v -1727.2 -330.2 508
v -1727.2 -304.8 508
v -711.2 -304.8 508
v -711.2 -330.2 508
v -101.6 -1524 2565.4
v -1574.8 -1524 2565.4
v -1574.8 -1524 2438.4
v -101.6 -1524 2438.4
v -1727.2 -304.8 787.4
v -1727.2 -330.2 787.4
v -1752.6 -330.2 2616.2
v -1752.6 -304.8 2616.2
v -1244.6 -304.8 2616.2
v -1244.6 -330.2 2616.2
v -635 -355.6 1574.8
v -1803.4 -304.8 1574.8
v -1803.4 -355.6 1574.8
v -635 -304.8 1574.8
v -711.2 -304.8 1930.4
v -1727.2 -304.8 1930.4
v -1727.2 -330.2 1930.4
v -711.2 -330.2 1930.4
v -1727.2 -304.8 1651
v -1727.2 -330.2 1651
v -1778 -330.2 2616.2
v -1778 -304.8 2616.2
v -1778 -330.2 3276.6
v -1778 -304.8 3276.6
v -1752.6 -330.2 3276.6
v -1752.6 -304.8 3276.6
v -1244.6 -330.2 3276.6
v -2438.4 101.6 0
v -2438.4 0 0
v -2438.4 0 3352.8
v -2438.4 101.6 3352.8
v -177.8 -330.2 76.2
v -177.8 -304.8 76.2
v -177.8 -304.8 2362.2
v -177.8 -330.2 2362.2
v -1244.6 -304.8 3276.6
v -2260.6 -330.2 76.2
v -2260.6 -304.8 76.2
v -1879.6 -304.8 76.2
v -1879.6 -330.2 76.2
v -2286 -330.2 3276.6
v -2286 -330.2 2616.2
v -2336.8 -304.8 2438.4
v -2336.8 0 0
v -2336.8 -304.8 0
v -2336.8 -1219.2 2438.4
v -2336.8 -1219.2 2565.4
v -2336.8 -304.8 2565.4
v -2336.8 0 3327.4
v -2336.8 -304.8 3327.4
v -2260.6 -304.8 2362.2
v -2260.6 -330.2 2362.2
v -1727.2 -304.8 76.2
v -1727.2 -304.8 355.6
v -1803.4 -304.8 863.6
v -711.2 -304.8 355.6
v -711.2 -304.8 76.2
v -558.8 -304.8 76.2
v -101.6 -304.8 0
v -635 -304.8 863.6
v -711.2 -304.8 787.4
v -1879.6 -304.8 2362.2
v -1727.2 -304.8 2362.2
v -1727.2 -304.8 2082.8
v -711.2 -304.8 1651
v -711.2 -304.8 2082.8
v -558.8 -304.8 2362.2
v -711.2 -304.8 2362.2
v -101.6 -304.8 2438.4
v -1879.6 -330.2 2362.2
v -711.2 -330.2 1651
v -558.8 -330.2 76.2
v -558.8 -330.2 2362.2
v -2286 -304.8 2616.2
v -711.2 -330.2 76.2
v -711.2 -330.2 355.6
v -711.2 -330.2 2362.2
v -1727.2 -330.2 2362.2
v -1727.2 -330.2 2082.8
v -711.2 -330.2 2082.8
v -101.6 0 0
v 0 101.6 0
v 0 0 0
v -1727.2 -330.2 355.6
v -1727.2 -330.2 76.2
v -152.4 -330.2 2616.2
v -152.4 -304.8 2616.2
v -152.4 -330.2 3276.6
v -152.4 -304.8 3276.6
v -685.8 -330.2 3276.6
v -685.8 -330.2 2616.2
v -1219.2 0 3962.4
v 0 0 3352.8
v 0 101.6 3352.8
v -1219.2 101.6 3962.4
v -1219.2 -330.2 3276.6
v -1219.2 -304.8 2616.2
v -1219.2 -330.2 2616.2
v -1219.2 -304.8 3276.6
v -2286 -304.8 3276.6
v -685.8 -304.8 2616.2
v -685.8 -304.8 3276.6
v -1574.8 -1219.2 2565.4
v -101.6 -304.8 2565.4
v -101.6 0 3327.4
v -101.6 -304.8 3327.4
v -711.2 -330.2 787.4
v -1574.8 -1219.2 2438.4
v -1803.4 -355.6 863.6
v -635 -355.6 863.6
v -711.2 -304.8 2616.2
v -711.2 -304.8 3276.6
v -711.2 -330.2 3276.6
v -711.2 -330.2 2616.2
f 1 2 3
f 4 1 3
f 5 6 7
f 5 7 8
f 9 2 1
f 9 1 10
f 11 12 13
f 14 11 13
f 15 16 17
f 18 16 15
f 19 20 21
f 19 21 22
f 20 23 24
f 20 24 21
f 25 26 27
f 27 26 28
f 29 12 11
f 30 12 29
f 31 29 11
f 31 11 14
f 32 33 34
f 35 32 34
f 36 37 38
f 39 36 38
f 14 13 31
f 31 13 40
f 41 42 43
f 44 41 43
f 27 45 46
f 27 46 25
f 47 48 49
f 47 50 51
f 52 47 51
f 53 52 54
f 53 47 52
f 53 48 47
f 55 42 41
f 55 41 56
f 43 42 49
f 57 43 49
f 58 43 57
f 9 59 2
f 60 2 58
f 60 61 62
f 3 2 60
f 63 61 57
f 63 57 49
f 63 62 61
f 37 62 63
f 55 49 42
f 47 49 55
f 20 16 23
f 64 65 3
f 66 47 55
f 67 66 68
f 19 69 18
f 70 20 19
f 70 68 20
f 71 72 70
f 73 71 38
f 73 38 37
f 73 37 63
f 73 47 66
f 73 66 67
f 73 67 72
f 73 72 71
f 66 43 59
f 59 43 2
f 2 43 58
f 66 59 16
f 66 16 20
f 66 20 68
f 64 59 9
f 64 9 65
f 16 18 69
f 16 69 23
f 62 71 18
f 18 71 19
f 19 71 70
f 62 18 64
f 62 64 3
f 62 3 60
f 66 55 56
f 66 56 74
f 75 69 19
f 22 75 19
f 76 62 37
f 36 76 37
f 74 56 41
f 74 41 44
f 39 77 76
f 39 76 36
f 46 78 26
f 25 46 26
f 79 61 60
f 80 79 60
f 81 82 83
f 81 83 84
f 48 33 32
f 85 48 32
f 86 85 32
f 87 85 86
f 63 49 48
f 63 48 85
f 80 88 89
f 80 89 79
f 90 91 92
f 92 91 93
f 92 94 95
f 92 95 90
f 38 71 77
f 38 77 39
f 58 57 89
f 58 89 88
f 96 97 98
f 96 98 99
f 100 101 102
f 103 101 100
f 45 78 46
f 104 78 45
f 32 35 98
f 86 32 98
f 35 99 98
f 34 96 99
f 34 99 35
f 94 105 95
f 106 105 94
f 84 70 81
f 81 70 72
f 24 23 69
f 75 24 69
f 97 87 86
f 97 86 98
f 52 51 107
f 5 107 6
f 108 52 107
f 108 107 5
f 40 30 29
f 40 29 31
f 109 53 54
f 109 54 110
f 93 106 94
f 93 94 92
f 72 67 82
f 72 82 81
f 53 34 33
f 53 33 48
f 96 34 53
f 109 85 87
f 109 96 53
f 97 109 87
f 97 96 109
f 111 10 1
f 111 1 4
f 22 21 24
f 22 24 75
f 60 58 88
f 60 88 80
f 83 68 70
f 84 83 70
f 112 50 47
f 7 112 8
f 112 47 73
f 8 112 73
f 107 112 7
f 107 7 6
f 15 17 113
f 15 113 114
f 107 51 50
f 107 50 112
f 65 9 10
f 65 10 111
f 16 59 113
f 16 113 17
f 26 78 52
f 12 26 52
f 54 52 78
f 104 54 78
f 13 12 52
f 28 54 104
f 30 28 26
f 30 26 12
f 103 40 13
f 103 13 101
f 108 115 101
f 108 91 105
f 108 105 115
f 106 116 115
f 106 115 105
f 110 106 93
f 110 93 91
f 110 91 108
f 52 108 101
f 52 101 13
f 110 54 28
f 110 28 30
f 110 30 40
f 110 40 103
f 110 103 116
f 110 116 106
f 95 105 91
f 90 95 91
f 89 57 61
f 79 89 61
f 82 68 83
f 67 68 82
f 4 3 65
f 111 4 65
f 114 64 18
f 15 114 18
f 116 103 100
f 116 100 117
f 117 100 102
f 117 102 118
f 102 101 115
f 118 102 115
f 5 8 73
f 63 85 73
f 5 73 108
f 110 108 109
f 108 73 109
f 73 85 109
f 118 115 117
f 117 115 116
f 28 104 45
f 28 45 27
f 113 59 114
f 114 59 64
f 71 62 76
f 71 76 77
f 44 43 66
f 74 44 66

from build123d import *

# Parameters (mm, degrees)
F0_W      = 2438.4
F0_H      = 3352.8
F1_DEPTH  = 101.6
F2_W      = 2235.2
F2_H      = 2438.4
F3_DEPTH  = 304.8
F4_W      = 1168.4
F4_H      = 711.2
F5_DEPTH  = 50.8
F6_W      = 381
F6_H      = 2286
F6_W_2    = 1016
F6_H_2    = 279.4
F7_DEPTH  = 25.4
F8_W      = 2235.2
F8_H      = 127
F9_DEPTH  = 1219.2
F8_H_2    = 762
F10_DEPTH = 304.8
F11_W     = 508
F11_H     = 660.4
F11_W_2   = 533.4
F12_DEPTH = 25.4
F13_W     = 1473.2
F13_H     = 127
F14_DEPTH = 304.8


with BuildPart() as f1:
    # F0 (on Front) → F1 (new body)
    with BuildSketch(Plane.XZ):
        with Locations((-1219.2, 1676.4)):
            Rectangle(F0_W, F0_H)
        Polygon((-2438.4, 3352.8), (0, 3352.8), (-1219.2, 3962.4), align=None)
    extrude(amount=-F1_DEPTH)

    # F2 (on face) → F3 (join)
    with BuildSketch(Plane.XZ):
        with Locations((-1219.2, 1219.2)):
            Rectangle(F2_W, F2_H)
    extrude(amount=F3_DEPTH)

    # F4 (on face) → F5 (join)
    with BuildSketch(Plane.XZ.offset(304.8)):
        with Locations((-1219.2, 1219.2)):
            Rectangle(F4_W, F4_H)
    extrude(amount=F5_DEPTH)

    # F6 (on face) → F7 (join)
    with BuildSketch(Plane.XZ.offset(304.8)):
        with Locations((-368.3, 1219.2)):
            Rectangle(F6_W, F6_H)
        with Locations((-1219.2, 2222.5)):
            Rectangle(F6_W_2, F6_H_2)
        with Locations((-1219.2, 1790.7)):
            Rectangle(F6_W_2, F6_H_2)
        with Locations((-2070.1, 1219.2)):
            Rectangle(F6_W, F6_H)
        with Locations((-1219.2, 647.7)):
            Rectangle(F6_W_2, F6_H_2)
        with Locations((-1219.2, 215.9)):
            Rectangle(F6_W_2, F6_H_2)
    extrude(amount=F7_DEPTH)

    # F8 (on face) → F9 (join)
    with BuildSketch(Plane.XZ):
        with Locations((-1219.2, 2501.9)):
            Rectangle(F8_W, F8_H)
    extrude(amount=F9_DEPTH)

    # F8 (on face) → F10 (join)
    with BuildSketch(Plane.XZ):
        with Locations((-1219.2, 2946.4)):
            Rectangle(F8_W, F8_H_2)
    extrude(amount=F10_DEPTH)

    # F11 (on face) → F12 (join)
    with BuildSketch(Plane.XZ.offset(304.8)):
        with Locations((-2032, 2946.4)):
            Rectangle(F11_W, F11_H)
        with Locations((-1498.6, 2946.4)):
            Rectangle(F11_W, F11_H)
        with Locations((-965.2, 2946.4)):
            Rectangle(F11_W, F11_H)
        with Locations((-419.1, 2946.4)):
            Rectangle(F11_W_2, F11_H)
    extrude(amount=F12_DEPTH)

    # F13 (on face) → F14 (join)
    with BuildSketch(Plane.XZ.offset(1219.2)):
        with Locations((-838.2, 2501.9)):
            Rectangle(F13_W, F13_H)
    extrude(amount=F14_DEPTH)


solid = f1.part
